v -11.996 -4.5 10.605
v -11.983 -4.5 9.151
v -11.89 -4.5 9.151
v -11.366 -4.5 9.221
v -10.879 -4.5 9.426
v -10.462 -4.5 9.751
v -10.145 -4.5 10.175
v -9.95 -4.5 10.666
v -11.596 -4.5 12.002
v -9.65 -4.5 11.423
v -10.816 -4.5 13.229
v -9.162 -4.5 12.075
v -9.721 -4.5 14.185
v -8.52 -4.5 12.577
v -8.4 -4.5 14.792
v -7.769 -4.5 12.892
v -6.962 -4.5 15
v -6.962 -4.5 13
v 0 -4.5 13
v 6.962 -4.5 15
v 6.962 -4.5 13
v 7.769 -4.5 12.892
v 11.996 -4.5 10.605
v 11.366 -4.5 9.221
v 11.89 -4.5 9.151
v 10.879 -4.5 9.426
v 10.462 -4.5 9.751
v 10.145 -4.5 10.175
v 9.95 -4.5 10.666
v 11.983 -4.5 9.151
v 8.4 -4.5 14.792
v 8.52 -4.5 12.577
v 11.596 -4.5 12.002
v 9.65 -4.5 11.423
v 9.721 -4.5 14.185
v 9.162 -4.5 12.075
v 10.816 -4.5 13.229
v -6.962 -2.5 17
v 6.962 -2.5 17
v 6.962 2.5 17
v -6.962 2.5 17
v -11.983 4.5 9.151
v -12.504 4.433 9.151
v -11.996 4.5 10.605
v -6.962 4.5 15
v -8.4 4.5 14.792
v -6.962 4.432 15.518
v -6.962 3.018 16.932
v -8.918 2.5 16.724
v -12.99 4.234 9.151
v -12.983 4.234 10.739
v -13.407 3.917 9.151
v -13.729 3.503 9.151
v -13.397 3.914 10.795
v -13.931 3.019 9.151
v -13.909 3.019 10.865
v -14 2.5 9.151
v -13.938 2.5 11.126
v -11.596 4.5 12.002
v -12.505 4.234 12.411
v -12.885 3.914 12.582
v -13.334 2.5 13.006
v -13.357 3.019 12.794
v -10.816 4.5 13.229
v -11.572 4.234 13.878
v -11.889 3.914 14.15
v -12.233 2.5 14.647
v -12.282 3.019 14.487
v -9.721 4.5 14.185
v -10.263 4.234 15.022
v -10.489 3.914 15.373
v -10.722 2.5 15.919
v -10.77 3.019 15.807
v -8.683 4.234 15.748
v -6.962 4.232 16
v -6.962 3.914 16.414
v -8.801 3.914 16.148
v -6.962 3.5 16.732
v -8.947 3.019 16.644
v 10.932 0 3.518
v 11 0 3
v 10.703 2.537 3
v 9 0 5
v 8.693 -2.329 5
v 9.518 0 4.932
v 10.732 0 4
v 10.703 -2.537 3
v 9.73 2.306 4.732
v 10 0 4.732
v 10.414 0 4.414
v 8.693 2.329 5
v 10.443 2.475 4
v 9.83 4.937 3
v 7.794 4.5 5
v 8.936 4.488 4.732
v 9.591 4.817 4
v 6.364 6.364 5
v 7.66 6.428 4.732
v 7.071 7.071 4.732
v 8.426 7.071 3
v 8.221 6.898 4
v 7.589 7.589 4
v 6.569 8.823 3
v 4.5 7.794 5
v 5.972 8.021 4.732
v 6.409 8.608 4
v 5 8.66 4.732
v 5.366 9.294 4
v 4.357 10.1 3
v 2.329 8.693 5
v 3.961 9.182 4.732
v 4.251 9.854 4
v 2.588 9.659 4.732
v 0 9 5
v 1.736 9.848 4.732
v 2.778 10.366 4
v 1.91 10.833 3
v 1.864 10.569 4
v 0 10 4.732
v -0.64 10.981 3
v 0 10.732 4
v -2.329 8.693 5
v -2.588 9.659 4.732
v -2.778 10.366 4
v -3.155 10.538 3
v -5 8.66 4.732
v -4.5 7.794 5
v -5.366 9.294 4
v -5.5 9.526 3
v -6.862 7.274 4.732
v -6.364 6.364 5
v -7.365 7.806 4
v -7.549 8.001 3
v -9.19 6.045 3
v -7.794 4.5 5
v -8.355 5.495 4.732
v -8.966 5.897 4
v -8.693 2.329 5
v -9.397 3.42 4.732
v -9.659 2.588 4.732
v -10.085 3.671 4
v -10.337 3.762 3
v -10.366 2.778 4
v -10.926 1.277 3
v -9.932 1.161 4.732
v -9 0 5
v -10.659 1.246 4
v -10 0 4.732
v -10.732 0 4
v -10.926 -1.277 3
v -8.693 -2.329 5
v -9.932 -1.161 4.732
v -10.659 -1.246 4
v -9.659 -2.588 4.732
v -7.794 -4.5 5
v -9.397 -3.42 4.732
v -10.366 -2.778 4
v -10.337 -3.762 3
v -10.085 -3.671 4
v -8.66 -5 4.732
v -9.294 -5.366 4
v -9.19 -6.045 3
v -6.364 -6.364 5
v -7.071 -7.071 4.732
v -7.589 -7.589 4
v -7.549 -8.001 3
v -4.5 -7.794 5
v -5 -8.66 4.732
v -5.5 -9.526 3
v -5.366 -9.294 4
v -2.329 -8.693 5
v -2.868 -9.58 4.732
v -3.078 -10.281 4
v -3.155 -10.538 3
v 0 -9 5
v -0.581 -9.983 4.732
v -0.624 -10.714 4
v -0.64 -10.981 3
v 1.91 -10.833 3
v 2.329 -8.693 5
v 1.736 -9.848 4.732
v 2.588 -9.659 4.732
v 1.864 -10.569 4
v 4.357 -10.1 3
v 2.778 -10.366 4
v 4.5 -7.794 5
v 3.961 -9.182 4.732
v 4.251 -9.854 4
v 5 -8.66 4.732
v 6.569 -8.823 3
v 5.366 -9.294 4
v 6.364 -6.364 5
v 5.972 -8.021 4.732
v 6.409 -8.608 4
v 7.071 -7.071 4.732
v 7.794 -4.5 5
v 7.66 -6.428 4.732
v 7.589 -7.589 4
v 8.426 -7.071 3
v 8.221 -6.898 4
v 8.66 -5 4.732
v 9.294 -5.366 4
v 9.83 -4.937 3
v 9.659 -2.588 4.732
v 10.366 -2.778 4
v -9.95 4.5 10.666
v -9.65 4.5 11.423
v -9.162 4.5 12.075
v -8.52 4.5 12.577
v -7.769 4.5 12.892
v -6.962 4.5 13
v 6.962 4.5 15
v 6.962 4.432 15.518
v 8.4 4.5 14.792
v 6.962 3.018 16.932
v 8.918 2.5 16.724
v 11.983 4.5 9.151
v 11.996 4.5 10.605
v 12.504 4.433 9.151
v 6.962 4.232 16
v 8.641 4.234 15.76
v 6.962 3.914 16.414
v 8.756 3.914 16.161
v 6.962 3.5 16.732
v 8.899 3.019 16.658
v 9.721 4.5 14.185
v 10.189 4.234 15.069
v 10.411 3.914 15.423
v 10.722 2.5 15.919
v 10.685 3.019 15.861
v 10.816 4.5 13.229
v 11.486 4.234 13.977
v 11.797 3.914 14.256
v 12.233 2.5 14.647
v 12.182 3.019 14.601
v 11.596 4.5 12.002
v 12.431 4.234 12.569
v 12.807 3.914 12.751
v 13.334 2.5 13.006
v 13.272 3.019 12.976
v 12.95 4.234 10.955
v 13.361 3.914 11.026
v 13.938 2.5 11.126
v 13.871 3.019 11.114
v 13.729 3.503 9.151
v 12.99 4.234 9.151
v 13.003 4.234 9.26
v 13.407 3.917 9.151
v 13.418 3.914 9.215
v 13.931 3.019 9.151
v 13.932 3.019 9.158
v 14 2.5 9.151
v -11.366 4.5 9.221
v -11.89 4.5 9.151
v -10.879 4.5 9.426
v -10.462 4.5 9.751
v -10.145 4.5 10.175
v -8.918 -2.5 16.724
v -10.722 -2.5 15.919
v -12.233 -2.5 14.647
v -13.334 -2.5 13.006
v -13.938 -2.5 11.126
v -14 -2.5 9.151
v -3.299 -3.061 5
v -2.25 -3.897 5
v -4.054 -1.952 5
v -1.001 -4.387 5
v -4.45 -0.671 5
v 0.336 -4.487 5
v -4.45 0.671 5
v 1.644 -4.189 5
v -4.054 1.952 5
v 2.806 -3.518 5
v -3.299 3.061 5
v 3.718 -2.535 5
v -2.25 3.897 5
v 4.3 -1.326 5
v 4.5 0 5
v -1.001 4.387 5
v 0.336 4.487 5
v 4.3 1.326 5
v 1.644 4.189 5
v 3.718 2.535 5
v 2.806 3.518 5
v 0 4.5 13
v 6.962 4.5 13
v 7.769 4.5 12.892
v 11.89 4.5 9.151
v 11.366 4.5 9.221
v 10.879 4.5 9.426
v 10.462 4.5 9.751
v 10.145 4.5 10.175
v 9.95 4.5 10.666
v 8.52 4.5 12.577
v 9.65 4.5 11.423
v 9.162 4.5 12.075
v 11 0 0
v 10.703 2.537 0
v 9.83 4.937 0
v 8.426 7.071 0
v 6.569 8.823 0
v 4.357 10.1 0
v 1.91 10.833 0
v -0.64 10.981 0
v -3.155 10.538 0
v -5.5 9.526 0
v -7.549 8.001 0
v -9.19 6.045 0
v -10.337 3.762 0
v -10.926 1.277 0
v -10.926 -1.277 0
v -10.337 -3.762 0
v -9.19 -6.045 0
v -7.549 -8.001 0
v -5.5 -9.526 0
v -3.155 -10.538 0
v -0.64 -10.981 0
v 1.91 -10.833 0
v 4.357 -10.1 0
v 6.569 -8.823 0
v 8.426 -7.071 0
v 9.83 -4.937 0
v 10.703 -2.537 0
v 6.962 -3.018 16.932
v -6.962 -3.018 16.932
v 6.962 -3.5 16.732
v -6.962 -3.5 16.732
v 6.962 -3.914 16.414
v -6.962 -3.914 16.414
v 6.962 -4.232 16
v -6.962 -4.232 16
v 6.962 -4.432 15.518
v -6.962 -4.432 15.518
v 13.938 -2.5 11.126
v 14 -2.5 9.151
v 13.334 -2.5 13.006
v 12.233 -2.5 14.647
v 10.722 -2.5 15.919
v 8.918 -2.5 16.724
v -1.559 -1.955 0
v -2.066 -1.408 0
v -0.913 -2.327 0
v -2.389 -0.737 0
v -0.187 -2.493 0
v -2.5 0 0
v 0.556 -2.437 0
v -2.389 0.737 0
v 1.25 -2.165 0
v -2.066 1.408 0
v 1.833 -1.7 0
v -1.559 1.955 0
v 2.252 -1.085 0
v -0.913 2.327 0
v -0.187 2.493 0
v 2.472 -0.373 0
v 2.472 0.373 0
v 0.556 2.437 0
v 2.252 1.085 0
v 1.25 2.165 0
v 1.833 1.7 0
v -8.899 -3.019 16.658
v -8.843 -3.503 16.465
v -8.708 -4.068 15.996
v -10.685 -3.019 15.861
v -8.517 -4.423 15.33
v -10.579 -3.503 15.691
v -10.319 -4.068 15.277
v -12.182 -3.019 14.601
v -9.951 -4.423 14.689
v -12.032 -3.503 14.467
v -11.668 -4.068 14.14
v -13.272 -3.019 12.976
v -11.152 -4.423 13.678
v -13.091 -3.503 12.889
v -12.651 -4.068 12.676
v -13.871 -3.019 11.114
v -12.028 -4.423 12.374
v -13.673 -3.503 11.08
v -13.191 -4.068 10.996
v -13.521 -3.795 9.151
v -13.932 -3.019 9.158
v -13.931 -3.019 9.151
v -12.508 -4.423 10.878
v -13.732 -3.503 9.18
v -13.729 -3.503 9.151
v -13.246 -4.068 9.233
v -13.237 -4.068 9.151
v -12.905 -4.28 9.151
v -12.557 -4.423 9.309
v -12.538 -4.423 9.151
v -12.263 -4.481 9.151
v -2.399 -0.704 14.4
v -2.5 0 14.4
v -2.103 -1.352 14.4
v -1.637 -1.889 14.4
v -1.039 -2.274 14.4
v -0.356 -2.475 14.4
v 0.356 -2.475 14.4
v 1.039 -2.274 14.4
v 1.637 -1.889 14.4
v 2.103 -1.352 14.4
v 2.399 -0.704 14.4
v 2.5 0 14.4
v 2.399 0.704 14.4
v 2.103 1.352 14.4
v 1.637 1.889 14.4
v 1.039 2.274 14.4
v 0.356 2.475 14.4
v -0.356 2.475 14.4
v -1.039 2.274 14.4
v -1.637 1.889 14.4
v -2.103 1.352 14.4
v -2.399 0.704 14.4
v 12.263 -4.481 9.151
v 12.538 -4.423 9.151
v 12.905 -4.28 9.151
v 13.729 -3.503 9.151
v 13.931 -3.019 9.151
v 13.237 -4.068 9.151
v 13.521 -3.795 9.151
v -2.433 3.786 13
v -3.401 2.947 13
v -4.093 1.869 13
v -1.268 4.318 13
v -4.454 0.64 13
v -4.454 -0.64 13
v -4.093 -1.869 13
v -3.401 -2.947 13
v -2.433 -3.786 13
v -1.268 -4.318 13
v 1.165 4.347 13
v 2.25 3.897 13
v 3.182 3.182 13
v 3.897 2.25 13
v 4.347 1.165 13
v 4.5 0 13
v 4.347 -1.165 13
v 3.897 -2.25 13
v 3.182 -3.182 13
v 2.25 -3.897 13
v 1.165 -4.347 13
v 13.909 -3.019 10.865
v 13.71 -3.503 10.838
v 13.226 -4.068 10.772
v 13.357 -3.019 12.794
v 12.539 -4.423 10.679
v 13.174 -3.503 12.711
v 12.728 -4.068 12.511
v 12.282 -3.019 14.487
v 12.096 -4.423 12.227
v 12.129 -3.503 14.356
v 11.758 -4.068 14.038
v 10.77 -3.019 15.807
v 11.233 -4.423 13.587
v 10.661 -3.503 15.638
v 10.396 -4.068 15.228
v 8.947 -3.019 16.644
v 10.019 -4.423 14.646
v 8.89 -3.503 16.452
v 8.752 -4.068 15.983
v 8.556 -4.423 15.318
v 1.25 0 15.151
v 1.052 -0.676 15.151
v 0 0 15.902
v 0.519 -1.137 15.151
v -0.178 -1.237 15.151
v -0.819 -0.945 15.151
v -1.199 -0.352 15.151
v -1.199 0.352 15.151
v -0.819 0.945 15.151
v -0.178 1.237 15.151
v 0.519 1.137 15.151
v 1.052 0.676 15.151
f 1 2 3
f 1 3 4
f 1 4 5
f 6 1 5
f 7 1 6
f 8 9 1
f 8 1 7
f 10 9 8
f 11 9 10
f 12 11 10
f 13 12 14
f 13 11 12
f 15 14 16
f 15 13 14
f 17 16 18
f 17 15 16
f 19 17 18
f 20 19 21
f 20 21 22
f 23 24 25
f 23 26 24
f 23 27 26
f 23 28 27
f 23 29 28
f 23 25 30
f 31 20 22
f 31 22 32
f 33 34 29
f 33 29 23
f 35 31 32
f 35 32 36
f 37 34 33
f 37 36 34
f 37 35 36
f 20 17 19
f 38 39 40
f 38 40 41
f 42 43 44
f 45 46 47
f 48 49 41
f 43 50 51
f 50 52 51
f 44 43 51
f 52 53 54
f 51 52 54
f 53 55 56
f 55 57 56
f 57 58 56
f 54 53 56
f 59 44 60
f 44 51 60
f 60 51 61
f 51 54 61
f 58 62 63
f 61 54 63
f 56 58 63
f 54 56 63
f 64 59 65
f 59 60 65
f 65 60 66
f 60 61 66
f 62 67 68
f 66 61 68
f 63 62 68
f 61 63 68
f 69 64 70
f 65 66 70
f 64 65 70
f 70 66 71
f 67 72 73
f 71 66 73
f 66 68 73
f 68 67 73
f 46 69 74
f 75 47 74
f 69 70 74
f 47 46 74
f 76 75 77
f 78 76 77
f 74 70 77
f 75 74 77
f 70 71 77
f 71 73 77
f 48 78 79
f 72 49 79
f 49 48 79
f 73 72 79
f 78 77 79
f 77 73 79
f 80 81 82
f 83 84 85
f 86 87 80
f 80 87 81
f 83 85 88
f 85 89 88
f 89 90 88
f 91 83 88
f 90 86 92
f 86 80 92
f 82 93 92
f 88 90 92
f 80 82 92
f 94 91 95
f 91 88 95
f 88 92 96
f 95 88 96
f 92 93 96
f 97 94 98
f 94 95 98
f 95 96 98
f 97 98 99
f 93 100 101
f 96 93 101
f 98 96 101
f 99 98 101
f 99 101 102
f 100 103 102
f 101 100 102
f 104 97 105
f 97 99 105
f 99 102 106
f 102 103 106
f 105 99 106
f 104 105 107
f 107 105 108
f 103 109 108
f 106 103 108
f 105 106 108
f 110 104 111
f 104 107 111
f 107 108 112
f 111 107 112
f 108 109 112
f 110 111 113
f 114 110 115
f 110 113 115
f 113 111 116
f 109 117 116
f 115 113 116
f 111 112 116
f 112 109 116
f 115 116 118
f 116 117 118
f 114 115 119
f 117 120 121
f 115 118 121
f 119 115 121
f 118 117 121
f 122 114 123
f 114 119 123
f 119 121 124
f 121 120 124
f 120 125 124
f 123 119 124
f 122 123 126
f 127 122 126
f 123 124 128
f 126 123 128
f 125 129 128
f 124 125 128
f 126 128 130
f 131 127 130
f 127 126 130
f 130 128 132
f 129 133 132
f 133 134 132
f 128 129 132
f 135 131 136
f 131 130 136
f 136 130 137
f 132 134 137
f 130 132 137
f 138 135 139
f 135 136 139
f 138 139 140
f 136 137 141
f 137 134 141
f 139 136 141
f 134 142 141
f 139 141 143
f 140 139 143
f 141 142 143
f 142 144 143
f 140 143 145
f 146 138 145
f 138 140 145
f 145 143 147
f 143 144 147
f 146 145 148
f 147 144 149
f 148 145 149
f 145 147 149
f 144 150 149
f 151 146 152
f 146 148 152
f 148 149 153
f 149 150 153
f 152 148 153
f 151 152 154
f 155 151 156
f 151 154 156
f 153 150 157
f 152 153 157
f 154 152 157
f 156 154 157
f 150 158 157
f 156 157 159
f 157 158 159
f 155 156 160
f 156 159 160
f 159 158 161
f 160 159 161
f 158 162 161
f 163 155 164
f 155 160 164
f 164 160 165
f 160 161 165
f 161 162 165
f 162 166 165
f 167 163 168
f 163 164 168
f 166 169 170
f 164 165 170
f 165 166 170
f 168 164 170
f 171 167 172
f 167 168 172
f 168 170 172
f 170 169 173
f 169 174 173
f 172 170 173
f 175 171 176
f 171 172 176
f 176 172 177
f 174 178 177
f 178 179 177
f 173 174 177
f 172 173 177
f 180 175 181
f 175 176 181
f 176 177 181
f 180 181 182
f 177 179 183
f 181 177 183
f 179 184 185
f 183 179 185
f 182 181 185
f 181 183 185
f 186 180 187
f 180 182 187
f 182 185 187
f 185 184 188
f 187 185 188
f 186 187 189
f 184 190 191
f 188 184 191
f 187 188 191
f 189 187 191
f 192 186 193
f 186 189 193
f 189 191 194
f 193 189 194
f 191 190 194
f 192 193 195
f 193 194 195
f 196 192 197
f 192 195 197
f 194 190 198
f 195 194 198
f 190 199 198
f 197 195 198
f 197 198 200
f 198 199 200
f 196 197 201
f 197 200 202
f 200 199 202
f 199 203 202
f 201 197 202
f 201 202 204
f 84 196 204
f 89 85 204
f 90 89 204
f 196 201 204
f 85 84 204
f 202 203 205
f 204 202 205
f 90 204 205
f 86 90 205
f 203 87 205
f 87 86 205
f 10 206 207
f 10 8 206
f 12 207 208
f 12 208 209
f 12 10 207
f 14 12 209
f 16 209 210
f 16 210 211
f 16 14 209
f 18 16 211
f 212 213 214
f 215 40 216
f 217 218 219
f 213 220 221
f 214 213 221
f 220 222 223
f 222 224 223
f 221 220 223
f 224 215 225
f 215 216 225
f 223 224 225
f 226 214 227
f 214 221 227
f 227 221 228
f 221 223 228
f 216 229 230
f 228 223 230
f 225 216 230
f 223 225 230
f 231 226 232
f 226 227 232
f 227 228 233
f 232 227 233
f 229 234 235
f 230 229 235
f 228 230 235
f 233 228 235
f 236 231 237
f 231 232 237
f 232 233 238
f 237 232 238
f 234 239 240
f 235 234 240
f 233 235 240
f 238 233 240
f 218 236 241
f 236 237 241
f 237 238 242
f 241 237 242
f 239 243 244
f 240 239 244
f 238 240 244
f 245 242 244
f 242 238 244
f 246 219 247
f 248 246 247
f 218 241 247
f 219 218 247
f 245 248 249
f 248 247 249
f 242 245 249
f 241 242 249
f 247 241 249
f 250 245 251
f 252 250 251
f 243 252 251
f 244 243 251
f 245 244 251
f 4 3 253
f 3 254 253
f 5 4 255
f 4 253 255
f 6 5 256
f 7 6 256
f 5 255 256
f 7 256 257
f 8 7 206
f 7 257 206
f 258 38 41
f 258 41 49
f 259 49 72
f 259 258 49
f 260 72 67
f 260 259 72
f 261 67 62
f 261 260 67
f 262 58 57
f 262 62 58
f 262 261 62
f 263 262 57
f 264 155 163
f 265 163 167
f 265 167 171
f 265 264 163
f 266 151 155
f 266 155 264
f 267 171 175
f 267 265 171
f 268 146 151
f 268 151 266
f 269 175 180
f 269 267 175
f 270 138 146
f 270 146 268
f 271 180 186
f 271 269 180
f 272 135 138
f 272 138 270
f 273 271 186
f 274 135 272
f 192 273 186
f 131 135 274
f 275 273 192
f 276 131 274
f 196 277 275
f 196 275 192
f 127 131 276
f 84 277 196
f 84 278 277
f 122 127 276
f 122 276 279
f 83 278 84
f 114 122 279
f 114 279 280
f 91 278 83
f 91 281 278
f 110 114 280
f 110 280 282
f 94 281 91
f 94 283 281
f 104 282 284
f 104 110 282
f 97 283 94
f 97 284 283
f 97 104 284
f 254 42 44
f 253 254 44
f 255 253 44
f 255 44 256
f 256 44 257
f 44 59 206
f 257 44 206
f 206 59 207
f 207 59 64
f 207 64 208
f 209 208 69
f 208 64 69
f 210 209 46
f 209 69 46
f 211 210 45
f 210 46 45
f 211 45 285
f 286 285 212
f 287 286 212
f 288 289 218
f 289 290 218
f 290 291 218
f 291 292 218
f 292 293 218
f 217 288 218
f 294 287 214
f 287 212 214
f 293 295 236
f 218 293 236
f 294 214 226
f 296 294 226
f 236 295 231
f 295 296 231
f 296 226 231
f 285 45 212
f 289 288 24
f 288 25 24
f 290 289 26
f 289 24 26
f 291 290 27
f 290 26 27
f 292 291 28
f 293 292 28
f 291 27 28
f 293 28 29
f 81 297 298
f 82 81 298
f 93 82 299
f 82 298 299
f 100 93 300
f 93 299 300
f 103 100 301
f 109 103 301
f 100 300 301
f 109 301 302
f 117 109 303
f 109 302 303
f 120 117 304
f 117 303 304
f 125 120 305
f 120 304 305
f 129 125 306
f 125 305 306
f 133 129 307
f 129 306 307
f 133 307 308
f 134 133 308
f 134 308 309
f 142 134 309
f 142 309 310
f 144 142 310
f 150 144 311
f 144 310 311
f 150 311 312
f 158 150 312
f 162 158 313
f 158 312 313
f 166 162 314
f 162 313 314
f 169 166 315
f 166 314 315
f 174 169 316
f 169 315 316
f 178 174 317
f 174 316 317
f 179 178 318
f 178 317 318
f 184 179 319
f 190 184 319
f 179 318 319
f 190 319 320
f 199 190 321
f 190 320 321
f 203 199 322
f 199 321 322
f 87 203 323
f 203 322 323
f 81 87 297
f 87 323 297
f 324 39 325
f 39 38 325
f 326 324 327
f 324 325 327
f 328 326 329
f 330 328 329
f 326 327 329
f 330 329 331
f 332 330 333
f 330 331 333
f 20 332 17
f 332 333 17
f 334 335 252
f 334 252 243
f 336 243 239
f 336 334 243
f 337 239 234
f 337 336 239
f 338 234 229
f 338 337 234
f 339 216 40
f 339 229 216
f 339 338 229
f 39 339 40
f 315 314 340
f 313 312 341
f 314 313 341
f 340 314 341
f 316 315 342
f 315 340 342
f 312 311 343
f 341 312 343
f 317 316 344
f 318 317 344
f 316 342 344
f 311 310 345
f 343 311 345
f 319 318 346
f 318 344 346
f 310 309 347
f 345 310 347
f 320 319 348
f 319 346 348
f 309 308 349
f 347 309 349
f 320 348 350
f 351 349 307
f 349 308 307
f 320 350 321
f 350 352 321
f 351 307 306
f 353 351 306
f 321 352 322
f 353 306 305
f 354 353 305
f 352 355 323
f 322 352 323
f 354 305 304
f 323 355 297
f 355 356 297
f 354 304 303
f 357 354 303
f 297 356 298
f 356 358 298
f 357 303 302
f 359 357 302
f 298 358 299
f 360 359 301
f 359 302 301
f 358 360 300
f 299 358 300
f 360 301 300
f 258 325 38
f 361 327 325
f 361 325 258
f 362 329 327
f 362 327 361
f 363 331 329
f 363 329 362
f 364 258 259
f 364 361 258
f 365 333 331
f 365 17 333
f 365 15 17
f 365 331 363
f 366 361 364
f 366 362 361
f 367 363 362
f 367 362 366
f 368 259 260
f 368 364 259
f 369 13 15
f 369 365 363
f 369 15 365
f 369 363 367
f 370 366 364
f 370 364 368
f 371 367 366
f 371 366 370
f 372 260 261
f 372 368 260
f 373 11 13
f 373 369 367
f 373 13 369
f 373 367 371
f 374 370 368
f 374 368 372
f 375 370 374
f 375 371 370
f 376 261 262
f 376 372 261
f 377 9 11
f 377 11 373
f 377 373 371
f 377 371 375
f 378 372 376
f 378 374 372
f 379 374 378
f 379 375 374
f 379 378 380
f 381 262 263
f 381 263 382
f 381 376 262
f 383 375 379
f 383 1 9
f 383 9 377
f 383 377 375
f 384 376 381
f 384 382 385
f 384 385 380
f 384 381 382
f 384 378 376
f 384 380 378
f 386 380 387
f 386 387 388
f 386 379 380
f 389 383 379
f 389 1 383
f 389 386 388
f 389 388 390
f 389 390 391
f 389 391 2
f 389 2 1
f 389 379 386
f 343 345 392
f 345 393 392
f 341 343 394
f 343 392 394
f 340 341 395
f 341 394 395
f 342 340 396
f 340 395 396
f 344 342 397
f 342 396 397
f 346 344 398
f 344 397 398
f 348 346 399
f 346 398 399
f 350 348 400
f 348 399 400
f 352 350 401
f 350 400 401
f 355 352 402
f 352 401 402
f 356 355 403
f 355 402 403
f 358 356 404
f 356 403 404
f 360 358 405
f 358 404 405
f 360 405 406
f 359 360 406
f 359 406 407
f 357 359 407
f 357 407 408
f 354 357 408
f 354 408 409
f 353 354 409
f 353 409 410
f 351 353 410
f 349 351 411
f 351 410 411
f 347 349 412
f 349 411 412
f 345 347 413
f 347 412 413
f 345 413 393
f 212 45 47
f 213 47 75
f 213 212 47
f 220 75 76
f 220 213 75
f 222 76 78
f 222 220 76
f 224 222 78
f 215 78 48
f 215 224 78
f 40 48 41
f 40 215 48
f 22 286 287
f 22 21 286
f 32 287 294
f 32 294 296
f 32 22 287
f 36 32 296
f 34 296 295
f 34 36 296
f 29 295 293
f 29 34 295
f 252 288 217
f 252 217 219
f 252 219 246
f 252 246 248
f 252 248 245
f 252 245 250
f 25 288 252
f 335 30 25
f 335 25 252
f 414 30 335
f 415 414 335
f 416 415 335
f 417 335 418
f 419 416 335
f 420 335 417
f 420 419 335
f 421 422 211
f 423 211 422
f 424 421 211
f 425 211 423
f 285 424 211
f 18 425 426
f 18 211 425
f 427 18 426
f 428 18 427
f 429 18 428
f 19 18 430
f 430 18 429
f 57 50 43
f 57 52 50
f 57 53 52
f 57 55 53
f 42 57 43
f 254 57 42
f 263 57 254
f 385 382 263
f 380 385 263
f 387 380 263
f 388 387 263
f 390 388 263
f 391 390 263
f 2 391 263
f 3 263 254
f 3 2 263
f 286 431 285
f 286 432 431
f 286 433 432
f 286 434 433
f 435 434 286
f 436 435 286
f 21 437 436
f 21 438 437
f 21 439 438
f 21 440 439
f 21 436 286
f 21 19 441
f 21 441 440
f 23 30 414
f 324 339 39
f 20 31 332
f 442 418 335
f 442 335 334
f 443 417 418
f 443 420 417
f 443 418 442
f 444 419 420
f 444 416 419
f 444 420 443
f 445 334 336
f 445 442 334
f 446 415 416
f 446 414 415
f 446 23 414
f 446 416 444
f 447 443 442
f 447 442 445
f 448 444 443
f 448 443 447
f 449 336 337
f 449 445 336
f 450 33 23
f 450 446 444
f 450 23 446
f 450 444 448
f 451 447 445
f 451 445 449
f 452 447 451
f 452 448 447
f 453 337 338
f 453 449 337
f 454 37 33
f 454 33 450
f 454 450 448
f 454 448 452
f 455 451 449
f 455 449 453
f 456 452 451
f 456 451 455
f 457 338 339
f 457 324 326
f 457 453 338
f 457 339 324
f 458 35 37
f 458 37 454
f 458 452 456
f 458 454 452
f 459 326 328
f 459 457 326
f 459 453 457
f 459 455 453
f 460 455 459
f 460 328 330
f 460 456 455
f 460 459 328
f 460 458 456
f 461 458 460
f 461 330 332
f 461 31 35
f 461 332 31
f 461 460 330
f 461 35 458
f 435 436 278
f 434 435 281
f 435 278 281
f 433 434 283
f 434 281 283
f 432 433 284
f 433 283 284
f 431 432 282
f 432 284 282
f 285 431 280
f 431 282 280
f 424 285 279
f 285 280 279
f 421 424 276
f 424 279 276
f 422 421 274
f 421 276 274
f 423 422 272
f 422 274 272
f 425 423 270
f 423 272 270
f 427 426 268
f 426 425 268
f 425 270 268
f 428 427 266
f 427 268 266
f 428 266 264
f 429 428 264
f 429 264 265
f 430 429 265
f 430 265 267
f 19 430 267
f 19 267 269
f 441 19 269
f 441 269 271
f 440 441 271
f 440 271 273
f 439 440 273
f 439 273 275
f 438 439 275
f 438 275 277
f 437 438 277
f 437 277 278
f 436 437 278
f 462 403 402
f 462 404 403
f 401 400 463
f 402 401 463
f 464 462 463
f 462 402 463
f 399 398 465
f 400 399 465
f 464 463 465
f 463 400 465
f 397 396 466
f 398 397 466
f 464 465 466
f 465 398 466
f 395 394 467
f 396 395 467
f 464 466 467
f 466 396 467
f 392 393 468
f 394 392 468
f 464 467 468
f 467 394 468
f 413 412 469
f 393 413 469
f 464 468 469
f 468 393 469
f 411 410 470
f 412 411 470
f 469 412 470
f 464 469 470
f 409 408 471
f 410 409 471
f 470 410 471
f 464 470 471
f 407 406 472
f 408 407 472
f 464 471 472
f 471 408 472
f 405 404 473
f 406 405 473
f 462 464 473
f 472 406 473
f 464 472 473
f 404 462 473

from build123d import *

# Parameters (mm, degrees)
F0_R     = 11
F1_DEPTH = 5
F2_R     = 4.5
F3_DEPTH = 12
F5_DEPTH = 4.5
F6_R     = 2
F8_D     = 5
F8_DEPTH = 14.4
F8_TIP   = 1.5021515476


with BuildPart() as f1:
    # F0 (on Top) → F1 (new body)
    with BuildSketch(Plane.XY):
        Circle(F0_R)
    extrude(amount=F1_DEPTH)

    # F2 (on face) → F3 (join)
    with BuildSketch(Plane.XY.offset(5)):
        Circle(F2_R)
    extrude(amount=F3_DEPTH)

    # F4 (on Front) → F5 (join, symmetric)
    with BuildSketch(Plane.XZ):
        with BuildLine():
            Line((-6.9616497494, 13), (0, 13))
            Line((0, 13), (6.9616497494, 13))
            ThreePointArc((6.9616497494, 13), (9.3963810746, 11.8065304048), (9.9443754998, 9.1509723824))
            Line((9.9443754998, 9.1509723824), (14, 9.1509723824))
            ThreePointArc((14, 9.1509723824), (12.2329306372, 14.6466278196), (6.9616497494, 17))
            Line((6.9616497494, 17), (0, 17))
            Line((0, 17), (-6.9616497494, 17))
            ThreePointArc((-6.9616497494, 17), (-12.2329306372, 14.6466278196), (-14, 9.1509723824))
            Line((-14, 9.1509723824), (-9.9443754998, 9.1509723824))
            ThreePointArc((-9.9443754998, 9.1509723824), (-9.3963810746, 11.8065304048), (-6.9616497494, 13))
        make_face()
    extrude(amount=F5_DEPTH, both=True)

    # F6
    f6_edges = [f1.edges().sort_by_distance(p)[0] for p in [
        (-11, 0, 5),
        (0, -4.5, 17),
        (0, 4.5, 17),
        (-9.944375, 0, 9.150972),
        (9.944375, 0, 9.150972),
    ]]
    fillet(f6_edges, radius=F6_R)

    # F8
    with Locations(Plane(origin=(0, 0, 0), x_dir=(1, 0, 0), z_dir=(0, 0, -1))):
        with Locations((0, 0)):
            Hole(F8_D / 2, depth=F8_DEPTH)
            with Locations((0, 0, -(F8_DEPTH + F8_TIP / 2))):  # 118° drill point
                Cone(0, F8_D / 2, F8_TIP, mode=Mode.SUBTRACT)


solid = f1.part
